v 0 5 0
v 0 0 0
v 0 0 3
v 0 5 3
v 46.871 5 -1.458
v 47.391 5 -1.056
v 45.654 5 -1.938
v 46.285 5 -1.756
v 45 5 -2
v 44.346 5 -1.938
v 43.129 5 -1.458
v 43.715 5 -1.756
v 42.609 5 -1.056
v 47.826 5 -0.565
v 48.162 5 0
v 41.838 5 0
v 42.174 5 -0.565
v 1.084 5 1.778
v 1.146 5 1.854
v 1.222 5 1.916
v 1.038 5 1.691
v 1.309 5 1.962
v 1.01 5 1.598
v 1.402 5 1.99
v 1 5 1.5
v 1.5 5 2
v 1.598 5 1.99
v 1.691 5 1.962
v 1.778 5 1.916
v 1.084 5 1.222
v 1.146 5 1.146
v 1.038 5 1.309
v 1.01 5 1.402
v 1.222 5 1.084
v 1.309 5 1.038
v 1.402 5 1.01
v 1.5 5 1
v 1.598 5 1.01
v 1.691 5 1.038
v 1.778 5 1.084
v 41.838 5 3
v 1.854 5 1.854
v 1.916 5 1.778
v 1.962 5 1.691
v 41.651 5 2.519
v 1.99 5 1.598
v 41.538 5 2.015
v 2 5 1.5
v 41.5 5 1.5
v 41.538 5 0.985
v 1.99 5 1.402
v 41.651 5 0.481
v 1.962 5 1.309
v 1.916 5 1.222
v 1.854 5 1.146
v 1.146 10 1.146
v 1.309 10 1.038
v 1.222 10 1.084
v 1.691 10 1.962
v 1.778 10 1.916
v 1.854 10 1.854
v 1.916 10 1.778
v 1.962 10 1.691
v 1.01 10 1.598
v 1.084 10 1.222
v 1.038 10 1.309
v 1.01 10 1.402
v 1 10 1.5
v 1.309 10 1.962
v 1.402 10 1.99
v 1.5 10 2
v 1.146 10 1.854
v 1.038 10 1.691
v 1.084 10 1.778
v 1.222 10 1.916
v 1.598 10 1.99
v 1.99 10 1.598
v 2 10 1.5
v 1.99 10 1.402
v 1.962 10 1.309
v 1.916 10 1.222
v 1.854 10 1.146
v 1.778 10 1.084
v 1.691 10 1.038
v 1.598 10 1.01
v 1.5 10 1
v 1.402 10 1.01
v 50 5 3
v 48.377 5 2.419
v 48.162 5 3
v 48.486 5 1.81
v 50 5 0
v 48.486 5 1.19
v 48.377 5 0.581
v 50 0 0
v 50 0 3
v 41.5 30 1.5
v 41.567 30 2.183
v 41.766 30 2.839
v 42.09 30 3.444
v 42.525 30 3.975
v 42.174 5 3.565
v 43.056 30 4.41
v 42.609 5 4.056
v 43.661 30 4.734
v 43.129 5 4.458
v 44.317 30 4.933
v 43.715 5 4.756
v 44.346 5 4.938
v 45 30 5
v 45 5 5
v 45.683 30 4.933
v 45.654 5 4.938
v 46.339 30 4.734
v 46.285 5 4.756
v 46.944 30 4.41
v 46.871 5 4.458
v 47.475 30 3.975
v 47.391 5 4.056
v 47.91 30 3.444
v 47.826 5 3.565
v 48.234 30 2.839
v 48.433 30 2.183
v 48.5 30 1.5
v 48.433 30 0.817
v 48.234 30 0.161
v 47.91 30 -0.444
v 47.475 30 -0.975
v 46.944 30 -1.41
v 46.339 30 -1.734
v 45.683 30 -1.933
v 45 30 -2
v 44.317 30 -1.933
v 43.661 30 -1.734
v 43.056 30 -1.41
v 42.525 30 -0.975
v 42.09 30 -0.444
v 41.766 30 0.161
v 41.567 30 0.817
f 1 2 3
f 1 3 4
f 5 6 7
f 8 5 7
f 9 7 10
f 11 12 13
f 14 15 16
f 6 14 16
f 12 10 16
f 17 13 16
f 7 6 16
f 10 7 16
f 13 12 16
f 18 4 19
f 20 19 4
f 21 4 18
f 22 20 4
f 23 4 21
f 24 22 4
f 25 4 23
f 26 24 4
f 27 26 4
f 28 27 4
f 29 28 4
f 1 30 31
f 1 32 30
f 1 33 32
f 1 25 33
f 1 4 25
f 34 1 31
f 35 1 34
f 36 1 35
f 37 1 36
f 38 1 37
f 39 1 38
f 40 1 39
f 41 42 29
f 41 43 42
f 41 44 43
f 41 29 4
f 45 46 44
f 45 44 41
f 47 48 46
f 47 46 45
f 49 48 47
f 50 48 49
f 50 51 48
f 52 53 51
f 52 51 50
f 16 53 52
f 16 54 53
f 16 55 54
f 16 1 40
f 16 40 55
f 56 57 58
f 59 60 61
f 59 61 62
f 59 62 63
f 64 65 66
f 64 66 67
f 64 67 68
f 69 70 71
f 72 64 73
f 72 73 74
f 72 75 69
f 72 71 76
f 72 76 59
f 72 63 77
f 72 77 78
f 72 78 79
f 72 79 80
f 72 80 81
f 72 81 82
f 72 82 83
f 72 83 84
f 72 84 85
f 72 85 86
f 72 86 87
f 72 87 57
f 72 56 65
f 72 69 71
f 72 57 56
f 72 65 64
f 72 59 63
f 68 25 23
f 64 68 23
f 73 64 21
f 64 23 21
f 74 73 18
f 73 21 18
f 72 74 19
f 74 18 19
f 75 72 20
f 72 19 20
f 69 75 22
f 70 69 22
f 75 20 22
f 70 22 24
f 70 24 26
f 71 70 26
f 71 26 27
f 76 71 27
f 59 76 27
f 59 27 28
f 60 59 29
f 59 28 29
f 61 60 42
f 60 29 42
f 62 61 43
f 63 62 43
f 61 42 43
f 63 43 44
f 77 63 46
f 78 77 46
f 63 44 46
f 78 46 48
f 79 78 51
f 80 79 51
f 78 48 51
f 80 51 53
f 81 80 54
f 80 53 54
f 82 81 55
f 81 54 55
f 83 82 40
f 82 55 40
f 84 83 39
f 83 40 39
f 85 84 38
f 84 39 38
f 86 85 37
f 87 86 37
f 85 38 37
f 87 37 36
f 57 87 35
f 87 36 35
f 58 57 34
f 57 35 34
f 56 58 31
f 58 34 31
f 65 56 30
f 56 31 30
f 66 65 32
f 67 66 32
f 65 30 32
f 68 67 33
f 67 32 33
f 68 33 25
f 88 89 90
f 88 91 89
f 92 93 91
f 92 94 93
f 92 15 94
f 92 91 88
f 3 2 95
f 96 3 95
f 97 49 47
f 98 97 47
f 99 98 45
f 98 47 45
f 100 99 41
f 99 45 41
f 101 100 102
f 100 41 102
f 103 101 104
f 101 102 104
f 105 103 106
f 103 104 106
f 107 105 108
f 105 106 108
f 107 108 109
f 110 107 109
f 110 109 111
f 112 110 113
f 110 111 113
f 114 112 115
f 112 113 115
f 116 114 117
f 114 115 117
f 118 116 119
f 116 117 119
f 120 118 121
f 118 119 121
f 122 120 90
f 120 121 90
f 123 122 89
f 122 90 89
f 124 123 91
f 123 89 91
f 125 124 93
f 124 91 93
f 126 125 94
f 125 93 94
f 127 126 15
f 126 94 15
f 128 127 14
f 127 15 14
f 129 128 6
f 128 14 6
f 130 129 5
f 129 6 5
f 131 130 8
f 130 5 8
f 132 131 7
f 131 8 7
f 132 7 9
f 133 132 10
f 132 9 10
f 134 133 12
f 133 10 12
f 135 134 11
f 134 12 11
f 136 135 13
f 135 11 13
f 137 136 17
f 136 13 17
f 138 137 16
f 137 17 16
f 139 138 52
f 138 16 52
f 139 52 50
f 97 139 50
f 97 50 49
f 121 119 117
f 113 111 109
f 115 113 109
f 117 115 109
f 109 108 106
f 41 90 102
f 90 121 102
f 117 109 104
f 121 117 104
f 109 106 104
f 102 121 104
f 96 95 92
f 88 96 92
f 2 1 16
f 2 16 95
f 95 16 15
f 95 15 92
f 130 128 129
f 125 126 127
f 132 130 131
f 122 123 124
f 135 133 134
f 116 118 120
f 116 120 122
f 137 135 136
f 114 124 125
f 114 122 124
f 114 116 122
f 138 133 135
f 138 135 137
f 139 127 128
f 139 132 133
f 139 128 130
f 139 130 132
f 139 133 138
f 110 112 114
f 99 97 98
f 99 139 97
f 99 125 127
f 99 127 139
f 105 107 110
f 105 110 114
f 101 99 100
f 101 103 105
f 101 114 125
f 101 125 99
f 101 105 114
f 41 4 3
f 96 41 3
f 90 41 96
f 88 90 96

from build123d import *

# Parameters (mm, degrees)
F0_W     = 50
F0_H     = 5
F1_DEPTH = 3
F2_R     = 0.5
F3_DEPTH = 5
F4_R     = 3.5
F5_DEPTH = 25


with BuildPart() as f1:
    # F0 (on Top) → F1 (new body)
    with BuildSketch(Plane.XY):
        with Locations((25, 2.5)):
            Rectangle(F0_W, F0_H)
    extrude(amount=F1_DEPTH)

    # F2 (on face) → F3 (join)
    with BuildSketch(Plane(origin=(0, 5, 0), x_dir=(-1, 0, 0), z_dir=(0, 1, 0))):
        with Locations((-1.5, 1.5)):
            Circle(F2_R)
    extrude(amount=F3_DEPTH)

    # F4 (on face) → F5 (join)
    with BuildSketch(Plane(origin=(0, 5, 0), x_dir=(-1, 0, 0), z_dir=(0, 1, 0))):
        with Locations((-45, 1.5)):
            Circle(F4_R)
    extrude(amount=F5_DEPTH)


solid = f1.part
